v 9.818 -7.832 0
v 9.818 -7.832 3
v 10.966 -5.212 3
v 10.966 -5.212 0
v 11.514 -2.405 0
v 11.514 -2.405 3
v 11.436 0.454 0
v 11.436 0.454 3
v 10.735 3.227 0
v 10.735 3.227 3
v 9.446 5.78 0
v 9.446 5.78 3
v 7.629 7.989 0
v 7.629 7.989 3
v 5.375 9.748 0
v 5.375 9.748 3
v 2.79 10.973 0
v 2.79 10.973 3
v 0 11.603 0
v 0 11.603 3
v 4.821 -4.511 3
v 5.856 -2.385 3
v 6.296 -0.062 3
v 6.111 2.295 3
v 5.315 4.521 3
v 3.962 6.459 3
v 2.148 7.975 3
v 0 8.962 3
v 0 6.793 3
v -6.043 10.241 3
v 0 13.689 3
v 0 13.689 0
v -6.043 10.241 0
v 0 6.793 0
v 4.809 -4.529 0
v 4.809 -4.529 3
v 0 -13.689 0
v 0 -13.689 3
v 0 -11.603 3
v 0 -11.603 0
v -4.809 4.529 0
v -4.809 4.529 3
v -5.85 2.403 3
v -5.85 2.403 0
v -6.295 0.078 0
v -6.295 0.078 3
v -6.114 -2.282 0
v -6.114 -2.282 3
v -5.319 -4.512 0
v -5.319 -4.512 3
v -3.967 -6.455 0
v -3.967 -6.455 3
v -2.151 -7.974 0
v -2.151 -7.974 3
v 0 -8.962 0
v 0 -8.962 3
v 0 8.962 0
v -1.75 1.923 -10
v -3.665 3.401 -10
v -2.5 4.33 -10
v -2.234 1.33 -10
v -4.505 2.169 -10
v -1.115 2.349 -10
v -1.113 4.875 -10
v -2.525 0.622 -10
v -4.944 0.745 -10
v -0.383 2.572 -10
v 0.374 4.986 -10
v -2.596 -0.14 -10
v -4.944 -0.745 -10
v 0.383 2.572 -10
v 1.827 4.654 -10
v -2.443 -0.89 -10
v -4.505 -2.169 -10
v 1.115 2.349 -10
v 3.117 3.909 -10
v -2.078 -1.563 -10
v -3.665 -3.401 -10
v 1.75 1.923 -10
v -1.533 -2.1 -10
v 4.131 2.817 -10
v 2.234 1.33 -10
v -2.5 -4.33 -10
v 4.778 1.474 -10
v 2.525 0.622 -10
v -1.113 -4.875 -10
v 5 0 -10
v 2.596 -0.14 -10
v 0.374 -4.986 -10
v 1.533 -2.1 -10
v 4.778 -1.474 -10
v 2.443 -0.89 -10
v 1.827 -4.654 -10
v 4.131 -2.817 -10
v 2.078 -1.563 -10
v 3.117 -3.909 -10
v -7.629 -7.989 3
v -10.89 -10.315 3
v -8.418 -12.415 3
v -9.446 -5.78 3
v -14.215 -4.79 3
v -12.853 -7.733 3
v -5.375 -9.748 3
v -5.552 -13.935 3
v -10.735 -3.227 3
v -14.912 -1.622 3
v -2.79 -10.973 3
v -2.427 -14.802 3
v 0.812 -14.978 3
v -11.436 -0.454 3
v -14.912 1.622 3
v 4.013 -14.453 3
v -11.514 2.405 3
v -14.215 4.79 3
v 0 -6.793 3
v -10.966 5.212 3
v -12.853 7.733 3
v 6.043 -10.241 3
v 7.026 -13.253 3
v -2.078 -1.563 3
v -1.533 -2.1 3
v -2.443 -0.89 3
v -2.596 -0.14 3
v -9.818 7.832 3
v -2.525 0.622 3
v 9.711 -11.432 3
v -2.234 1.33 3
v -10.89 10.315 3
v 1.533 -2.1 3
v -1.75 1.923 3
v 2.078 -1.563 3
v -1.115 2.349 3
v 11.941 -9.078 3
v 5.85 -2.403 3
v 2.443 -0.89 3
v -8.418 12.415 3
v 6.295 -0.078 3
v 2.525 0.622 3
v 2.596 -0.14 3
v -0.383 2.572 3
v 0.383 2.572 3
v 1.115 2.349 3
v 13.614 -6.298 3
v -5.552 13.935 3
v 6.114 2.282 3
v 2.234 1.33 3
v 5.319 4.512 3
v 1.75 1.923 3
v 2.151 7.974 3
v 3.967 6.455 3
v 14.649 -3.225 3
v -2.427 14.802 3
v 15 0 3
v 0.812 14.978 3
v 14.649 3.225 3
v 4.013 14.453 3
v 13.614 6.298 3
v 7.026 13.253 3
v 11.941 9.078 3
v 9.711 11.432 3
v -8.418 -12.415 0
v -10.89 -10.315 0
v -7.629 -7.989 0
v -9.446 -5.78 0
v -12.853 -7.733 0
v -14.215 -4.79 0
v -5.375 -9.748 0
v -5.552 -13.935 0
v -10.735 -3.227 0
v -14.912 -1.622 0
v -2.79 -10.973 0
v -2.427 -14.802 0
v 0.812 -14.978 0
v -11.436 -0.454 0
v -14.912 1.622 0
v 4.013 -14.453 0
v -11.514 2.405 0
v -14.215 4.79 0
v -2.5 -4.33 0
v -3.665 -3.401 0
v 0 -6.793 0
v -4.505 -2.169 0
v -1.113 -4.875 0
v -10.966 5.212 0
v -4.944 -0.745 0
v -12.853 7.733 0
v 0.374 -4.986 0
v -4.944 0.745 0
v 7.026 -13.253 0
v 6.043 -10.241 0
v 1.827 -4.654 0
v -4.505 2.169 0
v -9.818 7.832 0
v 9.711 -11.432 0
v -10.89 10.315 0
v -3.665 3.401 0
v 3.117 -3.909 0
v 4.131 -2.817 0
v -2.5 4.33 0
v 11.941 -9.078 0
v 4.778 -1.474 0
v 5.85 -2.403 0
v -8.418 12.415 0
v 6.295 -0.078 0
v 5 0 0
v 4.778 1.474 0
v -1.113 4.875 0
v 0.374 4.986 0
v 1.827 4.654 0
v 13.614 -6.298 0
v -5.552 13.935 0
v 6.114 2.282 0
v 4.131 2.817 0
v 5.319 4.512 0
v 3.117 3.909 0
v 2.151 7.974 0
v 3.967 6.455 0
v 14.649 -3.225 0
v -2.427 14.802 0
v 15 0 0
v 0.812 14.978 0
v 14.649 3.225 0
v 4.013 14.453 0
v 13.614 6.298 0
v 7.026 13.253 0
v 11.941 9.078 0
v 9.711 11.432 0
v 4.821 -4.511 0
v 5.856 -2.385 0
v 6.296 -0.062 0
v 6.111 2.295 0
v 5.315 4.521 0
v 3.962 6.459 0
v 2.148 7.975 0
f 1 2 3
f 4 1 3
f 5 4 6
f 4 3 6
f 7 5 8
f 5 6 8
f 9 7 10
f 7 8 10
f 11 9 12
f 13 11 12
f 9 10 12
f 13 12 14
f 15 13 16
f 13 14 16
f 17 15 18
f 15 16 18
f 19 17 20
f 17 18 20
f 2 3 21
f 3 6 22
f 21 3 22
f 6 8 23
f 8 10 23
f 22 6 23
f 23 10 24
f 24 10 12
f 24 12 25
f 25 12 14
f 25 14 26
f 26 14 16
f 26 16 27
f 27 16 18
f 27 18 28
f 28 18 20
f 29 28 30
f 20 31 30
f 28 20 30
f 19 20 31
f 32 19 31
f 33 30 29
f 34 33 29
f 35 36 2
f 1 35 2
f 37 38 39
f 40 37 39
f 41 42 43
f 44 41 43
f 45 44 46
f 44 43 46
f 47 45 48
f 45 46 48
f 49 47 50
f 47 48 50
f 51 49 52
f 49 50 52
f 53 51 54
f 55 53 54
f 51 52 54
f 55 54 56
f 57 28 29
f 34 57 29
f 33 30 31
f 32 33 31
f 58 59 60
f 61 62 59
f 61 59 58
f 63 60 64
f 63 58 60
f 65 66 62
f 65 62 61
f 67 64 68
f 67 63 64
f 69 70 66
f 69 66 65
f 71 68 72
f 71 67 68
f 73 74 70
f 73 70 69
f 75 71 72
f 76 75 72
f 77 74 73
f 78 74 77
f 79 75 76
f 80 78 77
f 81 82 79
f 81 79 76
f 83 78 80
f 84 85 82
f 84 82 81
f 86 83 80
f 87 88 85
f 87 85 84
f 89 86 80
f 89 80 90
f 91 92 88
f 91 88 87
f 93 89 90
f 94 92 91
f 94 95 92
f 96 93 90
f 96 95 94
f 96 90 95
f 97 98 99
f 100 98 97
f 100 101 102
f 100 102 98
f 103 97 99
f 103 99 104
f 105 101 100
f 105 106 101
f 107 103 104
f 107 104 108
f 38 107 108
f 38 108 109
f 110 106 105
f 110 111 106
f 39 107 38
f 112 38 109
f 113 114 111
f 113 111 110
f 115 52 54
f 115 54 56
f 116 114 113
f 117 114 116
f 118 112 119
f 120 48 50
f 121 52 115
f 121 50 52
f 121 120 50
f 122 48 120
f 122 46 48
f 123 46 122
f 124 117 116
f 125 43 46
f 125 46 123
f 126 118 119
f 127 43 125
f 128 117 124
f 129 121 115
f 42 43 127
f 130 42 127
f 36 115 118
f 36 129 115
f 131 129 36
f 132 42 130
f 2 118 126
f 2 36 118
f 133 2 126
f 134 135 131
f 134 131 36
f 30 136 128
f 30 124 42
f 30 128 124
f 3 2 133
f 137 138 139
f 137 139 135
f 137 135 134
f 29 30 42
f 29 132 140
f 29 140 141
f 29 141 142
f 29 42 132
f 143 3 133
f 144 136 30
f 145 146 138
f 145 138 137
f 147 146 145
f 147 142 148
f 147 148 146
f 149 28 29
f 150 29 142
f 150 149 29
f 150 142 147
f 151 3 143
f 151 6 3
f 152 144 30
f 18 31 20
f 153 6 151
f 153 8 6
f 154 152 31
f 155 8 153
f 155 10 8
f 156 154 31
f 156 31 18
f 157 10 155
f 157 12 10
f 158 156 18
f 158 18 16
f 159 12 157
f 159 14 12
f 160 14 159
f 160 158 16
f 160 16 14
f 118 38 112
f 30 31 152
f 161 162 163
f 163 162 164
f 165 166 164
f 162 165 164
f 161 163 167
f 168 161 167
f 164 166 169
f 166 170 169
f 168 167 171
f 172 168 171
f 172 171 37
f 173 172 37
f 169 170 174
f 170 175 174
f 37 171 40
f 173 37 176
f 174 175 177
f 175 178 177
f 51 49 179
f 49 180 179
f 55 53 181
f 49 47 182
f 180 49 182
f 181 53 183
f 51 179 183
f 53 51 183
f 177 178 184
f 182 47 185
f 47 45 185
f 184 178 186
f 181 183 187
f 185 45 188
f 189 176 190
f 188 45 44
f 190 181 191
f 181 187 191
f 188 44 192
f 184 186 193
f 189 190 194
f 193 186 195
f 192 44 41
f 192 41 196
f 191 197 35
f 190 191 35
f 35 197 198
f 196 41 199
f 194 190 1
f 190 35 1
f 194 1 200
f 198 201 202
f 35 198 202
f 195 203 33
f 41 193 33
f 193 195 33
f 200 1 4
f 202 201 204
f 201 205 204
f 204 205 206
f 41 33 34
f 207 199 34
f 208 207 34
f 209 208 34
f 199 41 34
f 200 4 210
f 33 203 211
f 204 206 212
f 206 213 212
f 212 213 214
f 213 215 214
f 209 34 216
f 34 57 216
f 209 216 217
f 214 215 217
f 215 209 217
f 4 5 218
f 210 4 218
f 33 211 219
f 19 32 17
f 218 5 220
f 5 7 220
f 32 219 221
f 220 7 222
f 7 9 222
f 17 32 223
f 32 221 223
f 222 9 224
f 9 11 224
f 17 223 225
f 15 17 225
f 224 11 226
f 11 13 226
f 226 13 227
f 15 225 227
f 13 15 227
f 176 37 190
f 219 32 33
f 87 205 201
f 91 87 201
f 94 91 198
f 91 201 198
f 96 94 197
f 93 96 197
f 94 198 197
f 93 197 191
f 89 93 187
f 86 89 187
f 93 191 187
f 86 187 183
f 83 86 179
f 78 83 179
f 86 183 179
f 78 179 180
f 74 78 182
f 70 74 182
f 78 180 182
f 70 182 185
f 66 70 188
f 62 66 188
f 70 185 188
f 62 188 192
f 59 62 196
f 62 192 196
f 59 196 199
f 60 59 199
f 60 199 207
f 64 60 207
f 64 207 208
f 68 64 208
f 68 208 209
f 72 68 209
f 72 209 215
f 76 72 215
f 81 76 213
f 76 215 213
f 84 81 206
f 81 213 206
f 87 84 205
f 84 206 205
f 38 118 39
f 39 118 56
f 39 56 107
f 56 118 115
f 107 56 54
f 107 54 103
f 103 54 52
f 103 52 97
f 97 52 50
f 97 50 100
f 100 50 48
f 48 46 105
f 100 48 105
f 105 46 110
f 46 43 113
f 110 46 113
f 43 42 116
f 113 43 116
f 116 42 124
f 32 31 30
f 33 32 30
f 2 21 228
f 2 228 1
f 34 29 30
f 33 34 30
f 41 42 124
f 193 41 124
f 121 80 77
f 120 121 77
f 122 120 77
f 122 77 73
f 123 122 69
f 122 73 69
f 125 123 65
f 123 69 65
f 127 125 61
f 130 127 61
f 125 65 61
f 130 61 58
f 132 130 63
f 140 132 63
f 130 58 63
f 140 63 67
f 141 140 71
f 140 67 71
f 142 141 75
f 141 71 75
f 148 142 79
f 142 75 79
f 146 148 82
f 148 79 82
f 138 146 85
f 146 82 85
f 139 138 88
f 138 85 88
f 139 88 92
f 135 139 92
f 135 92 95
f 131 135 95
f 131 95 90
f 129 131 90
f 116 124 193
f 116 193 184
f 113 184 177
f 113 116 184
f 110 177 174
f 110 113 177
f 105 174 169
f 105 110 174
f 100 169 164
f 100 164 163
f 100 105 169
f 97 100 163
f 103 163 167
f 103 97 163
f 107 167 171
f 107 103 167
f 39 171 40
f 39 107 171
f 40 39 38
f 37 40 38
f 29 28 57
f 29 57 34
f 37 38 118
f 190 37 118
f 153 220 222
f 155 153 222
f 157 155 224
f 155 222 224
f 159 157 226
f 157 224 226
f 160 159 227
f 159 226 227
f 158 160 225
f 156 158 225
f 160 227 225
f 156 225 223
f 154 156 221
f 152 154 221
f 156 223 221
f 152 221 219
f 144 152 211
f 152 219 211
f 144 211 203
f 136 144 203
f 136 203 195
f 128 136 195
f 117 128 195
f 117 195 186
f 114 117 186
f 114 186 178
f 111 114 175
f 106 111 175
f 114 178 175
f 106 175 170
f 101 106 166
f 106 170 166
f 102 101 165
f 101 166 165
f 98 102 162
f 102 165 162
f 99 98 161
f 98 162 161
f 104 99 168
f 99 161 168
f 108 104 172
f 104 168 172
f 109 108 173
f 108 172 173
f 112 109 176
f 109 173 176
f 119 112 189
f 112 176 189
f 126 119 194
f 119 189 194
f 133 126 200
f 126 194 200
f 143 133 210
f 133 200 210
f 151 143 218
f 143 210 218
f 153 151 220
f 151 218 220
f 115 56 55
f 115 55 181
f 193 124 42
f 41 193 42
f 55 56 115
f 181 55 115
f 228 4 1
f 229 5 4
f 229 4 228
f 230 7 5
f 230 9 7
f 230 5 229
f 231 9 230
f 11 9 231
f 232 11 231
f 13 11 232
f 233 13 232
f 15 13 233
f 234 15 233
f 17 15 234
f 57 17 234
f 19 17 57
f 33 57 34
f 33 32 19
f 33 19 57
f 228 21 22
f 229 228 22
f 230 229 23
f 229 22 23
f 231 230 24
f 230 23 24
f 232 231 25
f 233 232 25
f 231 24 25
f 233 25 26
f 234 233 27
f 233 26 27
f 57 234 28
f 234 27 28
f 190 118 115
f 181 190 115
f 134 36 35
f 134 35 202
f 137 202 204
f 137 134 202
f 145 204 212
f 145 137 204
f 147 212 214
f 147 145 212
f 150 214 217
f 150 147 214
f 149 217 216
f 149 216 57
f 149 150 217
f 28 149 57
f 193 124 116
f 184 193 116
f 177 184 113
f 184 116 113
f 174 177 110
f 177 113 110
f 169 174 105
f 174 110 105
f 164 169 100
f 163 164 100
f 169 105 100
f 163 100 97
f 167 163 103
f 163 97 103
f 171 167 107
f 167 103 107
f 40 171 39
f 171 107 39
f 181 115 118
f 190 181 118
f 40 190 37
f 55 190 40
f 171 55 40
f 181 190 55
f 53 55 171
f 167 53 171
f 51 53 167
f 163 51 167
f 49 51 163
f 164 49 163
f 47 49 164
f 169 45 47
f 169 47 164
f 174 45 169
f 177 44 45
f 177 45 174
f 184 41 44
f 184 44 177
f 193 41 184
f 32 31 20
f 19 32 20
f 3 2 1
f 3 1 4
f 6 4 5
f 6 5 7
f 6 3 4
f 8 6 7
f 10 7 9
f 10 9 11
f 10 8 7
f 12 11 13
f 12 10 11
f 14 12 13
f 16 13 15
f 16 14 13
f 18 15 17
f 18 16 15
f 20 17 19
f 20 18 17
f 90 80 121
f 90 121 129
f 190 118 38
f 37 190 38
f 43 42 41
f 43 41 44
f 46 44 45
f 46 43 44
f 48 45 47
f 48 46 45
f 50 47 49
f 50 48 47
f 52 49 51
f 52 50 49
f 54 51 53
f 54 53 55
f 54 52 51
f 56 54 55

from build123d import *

# Parameters (mm, degrees)
PAD001_DEPTH       = 3
SKETCH_R           = 15
PAD_DEPTH          = 3
POCKET_DEPTH       = 5
POLARPATTERN_COUNT = 2
SKETCH002_R        = 5
PAD002_DEPTH       = 10
POCKET001_DEPTH    = 13.001


with BuildPart() as pad001:
    # Sketch007 → Pad001 (new body)
    with BuildSketch(Plane.XY.offset(3)):
        with BuildLine():
            Line((0, 8.962155), (0, 6.79326))
            Line((0, 6.79326), (-6.043384, 10.24135))
            Line((-6.043384, 10.24135), (0, 13.68944))
            Line((0, 13.68944), (-6e-06, 11.602829))
            ThreePointArc((9.818228, -7.831592), (10.160716, 4.53872), (-6e-06, 11.602829))
            Line((4.821207, -4.510569), (9.818228, -7.831592))
            ThreePointArc((4.821207, -4.510569), (5.787185, 3.434101), (0, 8.962155))
        make_face()
        with BuildLine():
            Line((-9.818227, 7.831595), (-4.808855, 4.529143))
            ThreePointArc((-4.808855, 4.529143), (-5.790936, -3.423597), (0, -8.962155))
            Line((0, -8.962155), (0, -6.79326))
            Line((0, -6.79326), (6.043384, -10.24135))
            Line((6.043384, -10.24135), (0, -13.68944))
            Line((0, -13.68944), (0, -11.602829))
            ThreePointArc((-9.818227, 7.831595), (-10.160719, -4.538716), (0, -11.602829))
        make_face()
    extrude(amount=-PAD001_DEPTH)


with BuildPart() as pocket001:
    # Sketch → Pad (new body)
    with BuildSketch(Plane.XY):
        Circle(SKETCH_R)
    extrude(amount=PAD_DEPTH)

    # Sketch001 → Pocket (cut)
    with BuildSketch(Plane.XY.offset(3)):
        with BuildLine():
            Line((-6.043384, 10.24135), (0, 6.79326))
            Line((0, 8.962155), (0, 6.79326))
            ThreePointArc((4.808855, -4.529143), (5.790936, 3.423597), (0, 8.962155))
            Line((4.808855, -4.529143), (9.818227, -7.831595))
            ThreePointArc((9.818227, -7.831595), (10.160719, 4.538716), (0, 11.602829))
            Line((0, 11.602829), (0, 13.68944))
            Line((0, 13.68944), (-6.043384, 10.24135))
        make_face()
    pocket = extrude(amount=-POCKET_DEPTH, mode=Mode.SUBTRACT)

    # PolarPattern: Pocket ×2 about axis
    polarpattern_axis = Axis((0, 0, 3), (0, 0, 1))
    for i in range(1, POLARPATTERN_COUNT):
        add(pocket.rotate(polarpattern_axis, i * 360 / POLARPATTERN_COUNT), mode=Mode.SUBTRACT)

    # Sketch002 → Pad002 (new body)
    with BuildSketch(Plane(origin=(0, 0, 0), x_dir=(1, 0, 0), z_dir=(0, 0, -1))):
        Circle(SKETCH002_R)
    extrude(amount=PAD002_DEPTH)

    # Sketch003 → Pocket001 (cut, through all)
    with BuildSketch(Plane(origin=(0, 0, -10), x_dir=(1, 0, 0), z_dir=(0, 0, -1))):
        with BuildLine():
            ThreePointArc((-1.533075, 2.099924), (0, -2.6), (1.533075, 2.099924))
            Line((-1.533075, 2.099924), (1.533075, 2.099924))
        make_face()
    extrude(amount=-POCKET001_DEPTH, mode=Mode.SUBTRACT)


solid = Compound([pad001.part, pocket001.part])
